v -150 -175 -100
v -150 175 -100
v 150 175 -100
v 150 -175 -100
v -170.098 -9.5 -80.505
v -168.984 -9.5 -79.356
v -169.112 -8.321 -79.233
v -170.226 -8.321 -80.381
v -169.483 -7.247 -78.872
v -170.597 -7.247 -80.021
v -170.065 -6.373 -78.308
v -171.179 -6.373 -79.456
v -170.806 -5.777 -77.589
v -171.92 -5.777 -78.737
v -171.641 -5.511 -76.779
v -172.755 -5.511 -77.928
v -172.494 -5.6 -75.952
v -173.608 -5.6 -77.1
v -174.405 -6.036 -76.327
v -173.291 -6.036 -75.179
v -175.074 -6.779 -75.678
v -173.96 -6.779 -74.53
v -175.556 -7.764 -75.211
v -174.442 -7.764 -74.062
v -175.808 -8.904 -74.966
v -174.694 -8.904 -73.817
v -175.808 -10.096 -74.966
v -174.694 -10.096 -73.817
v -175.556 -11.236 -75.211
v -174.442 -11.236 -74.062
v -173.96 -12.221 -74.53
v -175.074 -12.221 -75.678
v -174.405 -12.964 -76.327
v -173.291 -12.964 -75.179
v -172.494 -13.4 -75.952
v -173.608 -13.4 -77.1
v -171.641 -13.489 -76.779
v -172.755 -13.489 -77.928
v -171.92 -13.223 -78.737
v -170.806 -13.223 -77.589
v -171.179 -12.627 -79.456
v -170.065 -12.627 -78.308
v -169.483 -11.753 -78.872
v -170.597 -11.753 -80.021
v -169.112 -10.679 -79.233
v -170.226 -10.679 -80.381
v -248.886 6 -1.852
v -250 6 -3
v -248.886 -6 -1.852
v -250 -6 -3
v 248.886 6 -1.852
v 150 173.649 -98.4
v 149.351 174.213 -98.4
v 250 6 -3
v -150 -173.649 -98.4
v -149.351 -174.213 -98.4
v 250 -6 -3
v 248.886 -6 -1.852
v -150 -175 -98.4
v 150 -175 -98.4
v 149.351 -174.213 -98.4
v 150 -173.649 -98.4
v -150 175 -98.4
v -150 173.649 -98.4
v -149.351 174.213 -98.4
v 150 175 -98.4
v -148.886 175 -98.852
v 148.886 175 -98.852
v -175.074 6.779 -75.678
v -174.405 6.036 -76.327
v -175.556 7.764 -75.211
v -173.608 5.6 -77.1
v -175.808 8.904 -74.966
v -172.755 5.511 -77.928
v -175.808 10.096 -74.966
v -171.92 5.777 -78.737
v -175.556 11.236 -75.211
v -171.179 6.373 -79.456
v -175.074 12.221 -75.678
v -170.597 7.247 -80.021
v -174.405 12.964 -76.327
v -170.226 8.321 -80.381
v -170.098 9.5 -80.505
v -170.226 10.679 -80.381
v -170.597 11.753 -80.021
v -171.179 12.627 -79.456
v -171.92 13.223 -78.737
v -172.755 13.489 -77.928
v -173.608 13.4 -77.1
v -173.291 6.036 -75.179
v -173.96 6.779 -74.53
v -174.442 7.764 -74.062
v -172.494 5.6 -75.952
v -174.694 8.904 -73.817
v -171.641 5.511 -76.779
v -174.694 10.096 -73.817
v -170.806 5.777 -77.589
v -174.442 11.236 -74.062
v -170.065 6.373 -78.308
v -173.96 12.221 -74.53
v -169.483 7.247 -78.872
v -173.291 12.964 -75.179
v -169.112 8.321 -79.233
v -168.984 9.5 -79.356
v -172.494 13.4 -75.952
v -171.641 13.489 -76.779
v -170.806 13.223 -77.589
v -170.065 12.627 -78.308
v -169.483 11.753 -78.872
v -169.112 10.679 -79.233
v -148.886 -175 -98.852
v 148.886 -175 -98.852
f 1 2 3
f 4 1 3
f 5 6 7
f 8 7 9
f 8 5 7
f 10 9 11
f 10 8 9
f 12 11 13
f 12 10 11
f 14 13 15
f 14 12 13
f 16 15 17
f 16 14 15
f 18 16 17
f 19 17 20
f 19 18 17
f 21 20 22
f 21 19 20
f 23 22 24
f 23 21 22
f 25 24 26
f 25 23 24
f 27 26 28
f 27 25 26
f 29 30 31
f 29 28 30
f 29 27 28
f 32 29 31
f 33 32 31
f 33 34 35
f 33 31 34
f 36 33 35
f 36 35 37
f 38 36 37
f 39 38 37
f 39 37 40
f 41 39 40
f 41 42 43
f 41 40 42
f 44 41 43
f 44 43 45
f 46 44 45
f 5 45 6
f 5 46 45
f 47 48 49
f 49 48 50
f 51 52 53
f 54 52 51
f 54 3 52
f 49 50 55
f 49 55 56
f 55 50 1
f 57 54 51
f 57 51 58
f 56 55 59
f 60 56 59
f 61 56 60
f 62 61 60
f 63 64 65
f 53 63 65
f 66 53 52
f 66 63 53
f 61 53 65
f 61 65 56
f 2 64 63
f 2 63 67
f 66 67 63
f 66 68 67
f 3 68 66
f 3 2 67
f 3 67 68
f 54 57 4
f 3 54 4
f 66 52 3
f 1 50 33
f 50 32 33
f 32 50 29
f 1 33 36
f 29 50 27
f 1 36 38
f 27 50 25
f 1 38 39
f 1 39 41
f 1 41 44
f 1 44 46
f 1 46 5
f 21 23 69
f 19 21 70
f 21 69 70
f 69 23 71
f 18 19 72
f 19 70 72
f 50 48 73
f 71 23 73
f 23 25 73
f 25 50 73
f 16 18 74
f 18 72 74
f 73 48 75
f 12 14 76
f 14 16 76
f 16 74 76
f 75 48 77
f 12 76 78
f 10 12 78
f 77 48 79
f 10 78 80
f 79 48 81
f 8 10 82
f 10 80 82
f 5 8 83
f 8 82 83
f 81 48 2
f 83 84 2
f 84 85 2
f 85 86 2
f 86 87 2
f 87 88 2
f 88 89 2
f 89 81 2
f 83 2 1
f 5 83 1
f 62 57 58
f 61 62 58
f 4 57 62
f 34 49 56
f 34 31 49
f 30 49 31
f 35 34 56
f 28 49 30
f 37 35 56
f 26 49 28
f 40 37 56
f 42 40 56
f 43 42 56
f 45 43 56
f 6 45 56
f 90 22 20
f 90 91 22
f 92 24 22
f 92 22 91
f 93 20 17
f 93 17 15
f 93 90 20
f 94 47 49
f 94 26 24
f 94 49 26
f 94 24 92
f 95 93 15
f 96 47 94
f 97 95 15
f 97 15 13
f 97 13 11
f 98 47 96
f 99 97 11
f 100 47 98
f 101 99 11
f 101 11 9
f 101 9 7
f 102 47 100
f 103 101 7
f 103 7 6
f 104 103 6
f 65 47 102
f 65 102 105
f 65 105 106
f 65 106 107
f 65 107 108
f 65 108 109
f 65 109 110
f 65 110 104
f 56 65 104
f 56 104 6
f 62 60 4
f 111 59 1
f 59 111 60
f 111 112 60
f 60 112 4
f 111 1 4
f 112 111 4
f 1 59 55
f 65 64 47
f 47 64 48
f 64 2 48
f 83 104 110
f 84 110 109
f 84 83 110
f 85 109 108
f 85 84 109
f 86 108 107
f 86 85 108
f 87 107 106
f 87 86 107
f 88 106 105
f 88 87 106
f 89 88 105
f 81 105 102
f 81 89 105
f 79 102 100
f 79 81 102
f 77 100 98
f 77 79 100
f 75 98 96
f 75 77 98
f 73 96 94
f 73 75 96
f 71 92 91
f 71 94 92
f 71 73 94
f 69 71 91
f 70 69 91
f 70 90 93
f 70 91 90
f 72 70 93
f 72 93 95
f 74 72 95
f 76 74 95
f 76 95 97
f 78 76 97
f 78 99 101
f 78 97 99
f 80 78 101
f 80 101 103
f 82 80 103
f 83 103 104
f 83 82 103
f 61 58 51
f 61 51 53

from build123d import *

# Parameters (mm, degrees)
SKETCH003_W  = 300
SKETCH003_H  = 350
PAD003_DEPTH = 1.6
PAD004_DEPTH = 1.6
SKETCH005_R  = 4
POCKET_DEPTH = 348.954325


with BuildPart() as part:
    # Sketch003 → Pad003 (new body)
    with BuildSketch(Plane.XY):
        Rectangle(SKETCH003_W, SKETCH003_H)
    extrude(amount=PAD003_DEPTH)

    # Sketch004 (on Local_CS) → Pad004 (join)
    with BuildSketch(Plane(origin=(-150, 0, 0), x_dir=(0.717792, 0, -0.696258), z_dir=(0.696258, 0, 0.717792))):
        Polygon((0, -175), (0, 175), (-139.316187, 6), (-139.316187, -6), align=None)
    pad004 = extrude(amount=PAD004_DEPTH)

    # Mirrored001: Pad004 across YZ
    add(pad004.mirror(Plane.YZ))

    # Sketch005 (on Local_CS) → Pocket (cut, through all)
    with BuildSketch(Plane(origin=(-150, 0, 0), x_dir=(0.717792, 0, -0.696258), z_dir=(0.696258, 0, 0.717792))):
        with Locations((-32, 9.5)):
            Circle(SKETCH005_R)
        with Locations((-32, -9.5)):
            Circle(SKETCH005_R)
    extrude(amount=POCKET_DEPTH, mode=Mode.SUBTRACT)


with BuildPart() as part_1:
    # Body002 placement: moved
    add(part.part.moved(Location((0, 0, -100))))


solid = part_1.part
